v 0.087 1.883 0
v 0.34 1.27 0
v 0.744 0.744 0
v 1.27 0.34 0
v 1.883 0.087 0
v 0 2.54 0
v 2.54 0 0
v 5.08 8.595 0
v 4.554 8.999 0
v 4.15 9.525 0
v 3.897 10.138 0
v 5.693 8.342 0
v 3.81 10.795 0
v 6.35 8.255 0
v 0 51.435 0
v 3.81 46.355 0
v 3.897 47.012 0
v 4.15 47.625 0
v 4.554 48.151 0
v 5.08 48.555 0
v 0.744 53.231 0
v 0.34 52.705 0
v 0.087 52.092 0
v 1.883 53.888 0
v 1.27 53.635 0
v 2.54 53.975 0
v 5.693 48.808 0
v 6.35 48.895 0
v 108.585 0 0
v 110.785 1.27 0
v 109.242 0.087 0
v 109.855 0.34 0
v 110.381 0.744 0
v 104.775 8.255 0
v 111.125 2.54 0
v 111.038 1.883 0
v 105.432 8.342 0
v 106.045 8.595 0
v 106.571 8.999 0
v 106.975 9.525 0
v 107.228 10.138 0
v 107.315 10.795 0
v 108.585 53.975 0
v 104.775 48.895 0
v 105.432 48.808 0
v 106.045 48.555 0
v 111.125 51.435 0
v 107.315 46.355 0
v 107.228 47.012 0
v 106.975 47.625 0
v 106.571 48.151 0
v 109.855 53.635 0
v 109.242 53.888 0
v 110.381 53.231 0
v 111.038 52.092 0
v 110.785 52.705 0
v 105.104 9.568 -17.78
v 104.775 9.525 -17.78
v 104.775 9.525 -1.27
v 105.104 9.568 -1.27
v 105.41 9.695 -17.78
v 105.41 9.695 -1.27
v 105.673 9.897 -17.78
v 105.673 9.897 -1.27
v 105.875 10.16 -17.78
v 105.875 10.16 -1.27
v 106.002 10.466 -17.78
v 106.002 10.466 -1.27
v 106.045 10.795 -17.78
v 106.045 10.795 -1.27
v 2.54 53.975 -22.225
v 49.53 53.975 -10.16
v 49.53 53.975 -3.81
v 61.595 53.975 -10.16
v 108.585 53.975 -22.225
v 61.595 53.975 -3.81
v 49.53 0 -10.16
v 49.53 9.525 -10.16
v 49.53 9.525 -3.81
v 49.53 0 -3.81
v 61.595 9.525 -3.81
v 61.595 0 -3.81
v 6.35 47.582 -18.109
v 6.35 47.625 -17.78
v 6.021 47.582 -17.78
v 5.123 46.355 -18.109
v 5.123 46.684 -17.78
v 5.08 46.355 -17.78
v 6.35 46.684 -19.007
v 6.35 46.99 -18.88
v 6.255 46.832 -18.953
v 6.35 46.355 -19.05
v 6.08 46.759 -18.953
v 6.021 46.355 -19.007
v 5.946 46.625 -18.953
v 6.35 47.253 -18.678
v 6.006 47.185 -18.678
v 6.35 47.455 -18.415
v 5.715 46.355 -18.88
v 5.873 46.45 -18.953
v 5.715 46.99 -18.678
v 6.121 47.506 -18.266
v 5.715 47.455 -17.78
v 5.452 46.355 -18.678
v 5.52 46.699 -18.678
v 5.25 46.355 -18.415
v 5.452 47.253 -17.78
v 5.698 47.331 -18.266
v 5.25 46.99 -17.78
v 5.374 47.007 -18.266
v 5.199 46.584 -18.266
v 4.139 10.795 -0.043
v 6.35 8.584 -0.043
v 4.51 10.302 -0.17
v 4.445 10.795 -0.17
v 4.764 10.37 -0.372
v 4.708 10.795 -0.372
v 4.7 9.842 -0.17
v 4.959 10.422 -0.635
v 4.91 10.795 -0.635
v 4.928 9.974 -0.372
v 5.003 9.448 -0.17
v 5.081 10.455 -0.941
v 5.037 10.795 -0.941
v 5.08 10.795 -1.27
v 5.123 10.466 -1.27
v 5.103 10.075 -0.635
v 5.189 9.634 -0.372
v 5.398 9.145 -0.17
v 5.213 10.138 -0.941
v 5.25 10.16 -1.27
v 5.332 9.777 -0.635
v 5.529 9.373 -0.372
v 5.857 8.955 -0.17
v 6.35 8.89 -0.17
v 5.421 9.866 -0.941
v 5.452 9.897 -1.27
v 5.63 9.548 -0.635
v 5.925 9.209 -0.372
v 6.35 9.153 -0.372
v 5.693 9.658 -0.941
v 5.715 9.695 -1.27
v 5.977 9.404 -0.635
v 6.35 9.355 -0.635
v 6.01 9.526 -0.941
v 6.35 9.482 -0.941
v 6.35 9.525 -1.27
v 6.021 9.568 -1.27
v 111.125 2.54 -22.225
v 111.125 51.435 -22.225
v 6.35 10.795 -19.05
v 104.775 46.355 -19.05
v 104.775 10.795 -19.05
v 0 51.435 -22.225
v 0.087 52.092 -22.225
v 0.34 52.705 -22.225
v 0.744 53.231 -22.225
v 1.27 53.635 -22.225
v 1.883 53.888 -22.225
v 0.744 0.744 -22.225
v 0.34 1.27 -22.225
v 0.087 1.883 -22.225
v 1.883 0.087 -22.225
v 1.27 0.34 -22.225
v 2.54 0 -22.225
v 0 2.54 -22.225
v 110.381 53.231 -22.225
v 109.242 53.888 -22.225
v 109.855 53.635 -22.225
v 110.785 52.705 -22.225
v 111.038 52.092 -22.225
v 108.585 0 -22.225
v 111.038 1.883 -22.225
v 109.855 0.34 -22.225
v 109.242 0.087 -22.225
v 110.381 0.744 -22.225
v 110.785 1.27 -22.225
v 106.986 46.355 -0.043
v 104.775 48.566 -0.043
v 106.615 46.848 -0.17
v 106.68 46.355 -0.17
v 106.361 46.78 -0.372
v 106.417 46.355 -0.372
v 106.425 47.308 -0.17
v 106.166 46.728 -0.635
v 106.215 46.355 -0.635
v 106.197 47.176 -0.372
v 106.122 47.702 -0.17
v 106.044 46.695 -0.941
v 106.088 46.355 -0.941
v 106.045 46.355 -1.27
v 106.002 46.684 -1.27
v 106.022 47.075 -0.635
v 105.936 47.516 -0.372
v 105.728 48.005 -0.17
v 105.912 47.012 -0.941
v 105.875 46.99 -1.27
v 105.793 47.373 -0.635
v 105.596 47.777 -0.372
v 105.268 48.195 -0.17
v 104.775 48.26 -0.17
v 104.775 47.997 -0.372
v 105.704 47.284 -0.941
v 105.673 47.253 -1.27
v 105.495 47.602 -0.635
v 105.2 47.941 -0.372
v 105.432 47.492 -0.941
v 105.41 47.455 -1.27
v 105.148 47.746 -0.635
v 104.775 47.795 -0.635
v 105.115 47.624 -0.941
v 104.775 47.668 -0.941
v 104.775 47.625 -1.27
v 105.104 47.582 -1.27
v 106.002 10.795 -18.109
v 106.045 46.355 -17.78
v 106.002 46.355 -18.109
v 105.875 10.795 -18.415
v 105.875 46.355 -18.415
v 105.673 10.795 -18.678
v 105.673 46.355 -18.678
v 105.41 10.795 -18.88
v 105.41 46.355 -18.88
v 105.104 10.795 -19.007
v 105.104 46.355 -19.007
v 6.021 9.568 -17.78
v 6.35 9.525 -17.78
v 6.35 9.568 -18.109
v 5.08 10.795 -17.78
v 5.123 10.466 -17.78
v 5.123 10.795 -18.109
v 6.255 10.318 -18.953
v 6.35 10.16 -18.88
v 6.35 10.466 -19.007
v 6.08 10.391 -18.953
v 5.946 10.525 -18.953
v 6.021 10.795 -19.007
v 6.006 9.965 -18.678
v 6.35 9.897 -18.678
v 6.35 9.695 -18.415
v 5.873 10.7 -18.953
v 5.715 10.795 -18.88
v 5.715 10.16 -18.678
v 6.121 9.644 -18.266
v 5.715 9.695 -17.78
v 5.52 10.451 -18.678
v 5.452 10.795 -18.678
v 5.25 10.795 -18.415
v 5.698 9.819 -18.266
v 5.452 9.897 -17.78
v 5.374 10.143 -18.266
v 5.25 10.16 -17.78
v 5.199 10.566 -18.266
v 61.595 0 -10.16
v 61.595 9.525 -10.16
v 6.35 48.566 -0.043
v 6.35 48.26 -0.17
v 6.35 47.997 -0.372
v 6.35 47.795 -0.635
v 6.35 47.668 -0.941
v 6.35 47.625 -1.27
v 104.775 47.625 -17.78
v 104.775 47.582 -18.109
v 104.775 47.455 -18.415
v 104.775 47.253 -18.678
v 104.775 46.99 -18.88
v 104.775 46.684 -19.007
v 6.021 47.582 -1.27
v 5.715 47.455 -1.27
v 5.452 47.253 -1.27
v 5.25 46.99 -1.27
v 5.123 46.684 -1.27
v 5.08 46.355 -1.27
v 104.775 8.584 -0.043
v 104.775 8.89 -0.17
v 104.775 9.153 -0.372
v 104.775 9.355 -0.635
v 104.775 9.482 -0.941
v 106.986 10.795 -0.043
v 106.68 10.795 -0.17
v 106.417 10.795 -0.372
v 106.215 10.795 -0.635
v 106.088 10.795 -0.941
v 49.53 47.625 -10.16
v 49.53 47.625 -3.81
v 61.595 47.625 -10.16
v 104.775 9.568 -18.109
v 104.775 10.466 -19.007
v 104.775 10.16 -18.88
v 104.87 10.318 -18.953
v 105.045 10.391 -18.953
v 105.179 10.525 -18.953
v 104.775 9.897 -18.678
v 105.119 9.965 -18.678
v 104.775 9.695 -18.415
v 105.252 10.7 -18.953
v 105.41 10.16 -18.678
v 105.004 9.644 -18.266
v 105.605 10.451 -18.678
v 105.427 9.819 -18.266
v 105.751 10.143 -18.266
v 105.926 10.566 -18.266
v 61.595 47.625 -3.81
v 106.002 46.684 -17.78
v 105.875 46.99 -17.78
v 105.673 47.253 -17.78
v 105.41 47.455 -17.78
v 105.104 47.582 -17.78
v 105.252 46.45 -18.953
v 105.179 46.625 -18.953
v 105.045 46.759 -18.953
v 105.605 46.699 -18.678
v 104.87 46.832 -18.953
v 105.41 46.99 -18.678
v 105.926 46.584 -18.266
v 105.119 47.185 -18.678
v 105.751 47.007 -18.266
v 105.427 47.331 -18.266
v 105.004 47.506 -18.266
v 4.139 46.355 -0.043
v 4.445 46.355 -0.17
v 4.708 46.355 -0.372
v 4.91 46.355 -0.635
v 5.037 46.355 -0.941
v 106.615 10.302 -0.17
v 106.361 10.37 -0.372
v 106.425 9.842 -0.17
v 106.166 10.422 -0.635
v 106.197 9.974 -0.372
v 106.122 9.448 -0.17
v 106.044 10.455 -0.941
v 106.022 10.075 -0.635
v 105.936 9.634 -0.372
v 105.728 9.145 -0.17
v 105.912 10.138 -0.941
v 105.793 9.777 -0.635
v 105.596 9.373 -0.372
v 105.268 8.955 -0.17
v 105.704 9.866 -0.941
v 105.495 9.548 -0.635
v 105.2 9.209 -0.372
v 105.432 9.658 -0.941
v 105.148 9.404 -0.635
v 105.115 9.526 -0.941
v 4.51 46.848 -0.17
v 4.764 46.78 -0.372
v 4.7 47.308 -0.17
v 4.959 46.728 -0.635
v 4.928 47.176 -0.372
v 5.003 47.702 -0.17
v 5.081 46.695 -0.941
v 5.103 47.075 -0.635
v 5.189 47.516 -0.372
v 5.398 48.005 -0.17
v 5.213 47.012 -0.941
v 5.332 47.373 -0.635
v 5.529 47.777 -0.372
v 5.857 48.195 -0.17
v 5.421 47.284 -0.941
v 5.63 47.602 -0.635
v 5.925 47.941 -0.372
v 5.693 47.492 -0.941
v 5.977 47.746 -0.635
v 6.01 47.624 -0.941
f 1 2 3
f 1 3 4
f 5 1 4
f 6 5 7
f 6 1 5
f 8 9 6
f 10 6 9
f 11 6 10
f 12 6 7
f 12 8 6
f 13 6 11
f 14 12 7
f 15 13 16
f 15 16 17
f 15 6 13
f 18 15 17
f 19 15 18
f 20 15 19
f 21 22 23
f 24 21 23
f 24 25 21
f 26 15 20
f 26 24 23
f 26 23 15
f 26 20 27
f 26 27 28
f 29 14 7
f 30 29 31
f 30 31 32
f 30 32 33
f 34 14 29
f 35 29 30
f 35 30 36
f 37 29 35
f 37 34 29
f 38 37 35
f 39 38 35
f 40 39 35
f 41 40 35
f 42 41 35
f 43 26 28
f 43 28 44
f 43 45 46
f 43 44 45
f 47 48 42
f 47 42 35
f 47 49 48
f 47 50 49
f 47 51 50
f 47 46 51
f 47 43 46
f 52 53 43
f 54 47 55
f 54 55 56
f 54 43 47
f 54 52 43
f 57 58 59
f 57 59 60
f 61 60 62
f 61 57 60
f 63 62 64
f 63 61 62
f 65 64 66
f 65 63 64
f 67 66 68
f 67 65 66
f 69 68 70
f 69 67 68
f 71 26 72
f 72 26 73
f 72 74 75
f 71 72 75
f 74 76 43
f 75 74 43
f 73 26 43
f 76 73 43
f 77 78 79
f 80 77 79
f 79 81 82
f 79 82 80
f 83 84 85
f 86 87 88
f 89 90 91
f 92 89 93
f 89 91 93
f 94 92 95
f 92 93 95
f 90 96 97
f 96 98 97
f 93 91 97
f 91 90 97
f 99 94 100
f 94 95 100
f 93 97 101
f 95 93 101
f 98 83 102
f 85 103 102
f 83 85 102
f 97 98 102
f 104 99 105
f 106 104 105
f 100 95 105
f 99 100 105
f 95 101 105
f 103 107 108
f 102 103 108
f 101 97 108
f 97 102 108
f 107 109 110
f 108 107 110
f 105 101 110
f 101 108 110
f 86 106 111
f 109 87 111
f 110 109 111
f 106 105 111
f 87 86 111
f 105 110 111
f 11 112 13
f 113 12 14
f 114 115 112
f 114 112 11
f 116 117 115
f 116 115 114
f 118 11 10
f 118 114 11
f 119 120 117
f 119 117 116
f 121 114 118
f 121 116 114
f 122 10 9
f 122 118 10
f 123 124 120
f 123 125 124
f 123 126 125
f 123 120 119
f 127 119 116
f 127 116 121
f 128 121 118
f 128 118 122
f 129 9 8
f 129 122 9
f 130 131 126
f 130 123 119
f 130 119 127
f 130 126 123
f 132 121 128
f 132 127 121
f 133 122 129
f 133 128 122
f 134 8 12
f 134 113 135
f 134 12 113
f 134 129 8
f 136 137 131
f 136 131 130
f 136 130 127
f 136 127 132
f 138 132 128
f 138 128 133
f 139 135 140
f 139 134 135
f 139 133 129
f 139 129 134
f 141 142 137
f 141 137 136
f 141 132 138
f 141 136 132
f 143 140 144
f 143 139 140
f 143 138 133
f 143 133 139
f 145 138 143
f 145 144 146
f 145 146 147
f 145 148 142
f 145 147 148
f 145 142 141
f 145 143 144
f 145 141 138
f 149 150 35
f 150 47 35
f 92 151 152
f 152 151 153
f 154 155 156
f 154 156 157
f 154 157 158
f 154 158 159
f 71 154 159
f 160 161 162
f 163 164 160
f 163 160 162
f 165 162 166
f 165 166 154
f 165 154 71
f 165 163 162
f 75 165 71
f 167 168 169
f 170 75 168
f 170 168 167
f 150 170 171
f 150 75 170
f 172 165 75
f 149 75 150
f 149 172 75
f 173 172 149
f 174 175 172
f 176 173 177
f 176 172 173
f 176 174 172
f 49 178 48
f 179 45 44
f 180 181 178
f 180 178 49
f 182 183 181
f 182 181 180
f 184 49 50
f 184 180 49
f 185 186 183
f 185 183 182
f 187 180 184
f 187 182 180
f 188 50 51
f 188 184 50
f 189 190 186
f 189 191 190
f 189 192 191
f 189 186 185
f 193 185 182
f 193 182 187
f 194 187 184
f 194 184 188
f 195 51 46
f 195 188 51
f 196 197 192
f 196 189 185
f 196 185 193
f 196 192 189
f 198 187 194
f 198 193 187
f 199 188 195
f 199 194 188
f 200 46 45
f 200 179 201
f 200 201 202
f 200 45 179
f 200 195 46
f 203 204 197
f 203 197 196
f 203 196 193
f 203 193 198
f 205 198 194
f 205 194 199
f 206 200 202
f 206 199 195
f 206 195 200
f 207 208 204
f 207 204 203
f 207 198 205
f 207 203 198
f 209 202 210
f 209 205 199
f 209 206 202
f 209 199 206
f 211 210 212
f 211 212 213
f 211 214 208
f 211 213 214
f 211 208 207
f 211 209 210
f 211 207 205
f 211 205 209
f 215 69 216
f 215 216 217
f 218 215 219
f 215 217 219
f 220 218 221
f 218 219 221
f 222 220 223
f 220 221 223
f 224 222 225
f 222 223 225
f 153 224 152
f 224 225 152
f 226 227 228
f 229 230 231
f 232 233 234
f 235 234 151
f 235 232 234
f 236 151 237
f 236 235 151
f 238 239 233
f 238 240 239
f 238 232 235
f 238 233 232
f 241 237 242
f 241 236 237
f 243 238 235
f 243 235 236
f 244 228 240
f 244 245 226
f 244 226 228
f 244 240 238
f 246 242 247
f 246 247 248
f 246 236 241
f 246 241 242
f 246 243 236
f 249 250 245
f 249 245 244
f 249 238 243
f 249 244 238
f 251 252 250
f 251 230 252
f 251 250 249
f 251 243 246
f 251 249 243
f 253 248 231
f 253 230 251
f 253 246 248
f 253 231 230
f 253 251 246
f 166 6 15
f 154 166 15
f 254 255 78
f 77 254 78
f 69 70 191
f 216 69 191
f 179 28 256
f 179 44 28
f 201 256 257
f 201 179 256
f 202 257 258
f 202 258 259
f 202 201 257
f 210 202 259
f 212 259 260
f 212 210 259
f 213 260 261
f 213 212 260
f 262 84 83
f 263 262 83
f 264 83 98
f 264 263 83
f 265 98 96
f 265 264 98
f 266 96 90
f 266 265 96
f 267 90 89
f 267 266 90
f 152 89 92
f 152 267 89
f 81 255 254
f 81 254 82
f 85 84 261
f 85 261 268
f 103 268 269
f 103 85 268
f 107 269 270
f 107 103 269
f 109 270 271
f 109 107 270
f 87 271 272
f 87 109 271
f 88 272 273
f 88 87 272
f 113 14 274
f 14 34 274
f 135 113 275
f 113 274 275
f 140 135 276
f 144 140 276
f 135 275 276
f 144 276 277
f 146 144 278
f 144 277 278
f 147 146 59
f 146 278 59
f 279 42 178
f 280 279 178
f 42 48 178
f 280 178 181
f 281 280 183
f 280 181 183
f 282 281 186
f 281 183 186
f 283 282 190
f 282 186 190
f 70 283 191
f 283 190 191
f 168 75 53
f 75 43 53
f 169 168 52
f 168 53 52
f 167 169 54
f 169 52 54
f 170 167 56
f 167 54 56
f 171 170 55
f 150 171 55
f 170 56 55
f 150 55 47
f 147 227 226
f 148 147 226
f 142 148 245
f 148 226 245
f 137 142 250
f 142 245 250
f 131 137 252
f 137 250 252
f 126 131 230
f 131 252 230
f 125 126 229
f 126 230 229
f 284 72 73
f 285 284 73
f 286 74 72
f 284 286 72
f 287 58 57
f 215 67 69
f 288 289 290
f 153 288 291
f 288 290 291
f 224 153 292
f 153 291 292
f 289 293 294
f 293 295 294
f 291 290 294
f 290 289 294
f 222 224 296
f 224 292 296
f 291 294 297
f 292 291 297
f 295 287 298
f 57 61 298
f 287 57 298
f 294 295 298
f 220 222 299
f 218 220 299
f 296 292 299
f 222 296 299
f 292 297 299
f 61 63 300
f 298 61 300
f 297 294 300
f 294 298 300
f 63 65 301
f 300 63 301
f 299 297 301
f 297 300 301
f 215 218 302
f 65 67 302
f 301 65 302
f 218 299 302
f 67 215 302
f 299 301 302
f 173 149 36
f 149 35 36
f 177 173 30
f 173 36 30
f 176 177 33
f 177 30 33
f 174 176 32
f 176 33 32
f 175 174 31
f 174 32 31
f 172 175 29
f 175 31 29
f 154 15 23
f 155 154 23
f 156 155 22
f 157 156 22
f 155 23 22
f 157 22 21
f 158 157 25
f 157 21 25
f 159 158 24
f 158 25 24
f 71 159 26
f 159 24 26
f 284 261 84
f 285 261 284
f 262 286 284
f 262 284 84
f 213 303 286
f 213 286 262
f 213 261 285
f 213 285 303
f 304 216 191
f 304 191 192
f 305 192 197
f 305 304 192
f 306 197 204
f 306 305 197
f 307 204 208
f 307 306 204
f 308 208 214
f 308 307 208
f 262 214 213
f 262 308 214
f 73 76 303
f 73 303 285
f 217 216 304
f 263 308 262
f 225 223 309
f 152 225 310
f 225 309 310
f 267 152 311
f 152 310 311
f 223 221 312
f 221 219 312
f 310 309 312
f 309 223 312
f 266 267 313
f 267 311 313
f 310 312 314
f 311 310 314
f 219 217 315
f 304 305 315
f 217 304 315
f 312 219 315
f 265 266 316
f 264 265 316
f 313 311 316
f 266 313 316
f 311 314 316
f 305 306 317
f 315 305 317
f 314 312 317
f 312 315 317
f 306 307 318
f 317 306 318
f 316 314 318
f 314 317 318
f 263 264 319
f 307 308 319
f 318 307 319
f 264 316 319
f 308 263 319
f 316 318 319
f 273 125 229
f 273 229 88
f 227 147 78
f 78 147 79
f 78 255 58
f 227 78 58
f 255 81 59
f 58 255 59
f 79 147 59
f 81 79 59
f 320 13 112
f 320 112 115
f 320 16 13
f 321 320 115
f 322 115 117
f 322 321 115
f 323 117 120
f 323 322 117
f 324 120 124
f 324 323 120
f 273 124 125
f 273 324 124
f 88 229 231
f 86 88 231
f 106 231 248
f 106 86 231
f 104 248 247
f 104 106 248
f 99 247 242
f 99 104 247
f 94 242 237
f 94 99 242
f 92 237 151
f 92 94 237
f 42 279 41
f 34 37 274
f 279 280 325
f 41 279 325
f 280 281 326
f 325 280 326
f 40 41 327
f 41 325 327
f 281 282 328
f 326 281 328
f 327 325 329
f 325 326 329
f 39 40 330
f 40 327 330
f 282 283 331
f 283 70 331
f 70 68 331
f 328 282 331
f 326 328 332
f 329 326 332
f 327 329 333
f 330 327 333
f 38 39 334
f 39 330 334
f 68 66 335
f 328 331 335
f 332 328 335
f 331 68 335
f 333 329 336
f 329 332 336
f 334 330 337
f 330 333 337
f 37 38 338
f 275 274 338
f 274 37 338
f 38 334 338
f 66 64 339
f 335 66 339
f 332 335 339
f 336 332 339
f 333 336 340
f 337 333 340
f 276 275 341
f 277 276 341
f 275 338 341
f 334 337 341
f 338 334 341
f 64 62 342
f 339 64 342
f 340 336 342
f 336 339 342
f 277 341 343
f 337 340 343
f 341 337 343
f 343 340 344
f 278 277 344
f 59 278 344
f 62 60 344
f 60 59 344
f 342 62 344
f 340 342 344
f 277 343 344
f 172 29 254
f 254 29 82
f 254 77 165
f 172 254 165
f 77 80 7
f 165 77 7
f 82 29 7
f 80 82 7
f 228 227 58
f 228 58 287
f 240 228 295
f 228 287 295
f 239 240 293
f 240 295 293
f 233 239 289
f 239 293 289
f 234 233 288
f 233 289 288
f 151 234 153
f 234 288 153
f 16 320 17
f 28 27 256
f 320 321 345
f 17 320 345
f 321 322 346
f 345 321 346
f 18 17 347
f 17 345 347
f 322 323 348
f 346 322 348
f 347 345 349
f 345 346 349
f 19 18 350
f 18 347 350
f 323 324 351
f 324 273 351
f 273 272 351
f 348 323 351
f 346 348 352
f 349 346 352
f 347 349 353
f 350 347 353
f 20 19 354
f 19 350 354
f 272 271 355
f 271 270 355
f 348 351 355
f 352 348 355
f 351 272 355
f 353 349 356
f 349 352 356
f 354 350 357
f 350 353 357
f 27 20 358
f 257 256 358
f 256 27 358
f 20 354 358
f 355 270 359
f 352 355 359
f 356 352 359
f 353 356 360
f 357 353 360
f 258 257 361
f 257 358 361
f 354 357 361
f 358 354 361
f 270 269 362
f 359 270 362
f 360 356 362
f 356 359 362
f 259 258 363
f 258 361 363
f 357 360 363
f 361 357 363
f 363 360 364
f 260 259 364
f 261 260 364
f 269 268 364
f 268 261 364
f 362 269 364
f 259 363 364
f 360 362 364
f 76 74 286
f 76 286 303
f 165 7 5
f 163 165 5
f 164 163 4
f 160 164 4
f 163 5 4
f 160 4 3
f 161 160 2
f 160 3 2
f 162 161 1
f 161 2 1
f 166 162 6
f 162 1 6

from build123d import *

# Parameters (mm, degrees)
F0_W     = 100.965
F0_H     = 38.1
F1_DEPTH = 19.05
F2_W     = 50.4825
F2_H     = 20.6375
F2_H_2   = 17.4625
F3_DEPTH = 3.175
F4_W     = 12.065
F4_H     = 6.35
F5_DEPTH = 53.976
F6_R     = 1.27


with BuildPart() as f1:
    # F0 (on Top) → F1 (new body)
    with BuildSketch(Plane.XY):
        with BuildLine():
            ThreePointArc((0, 2.54), (0.7439487758, 0.7439487758), (2.54, 0))
            Line((2.54, 0), (108.585, 0))
            ThreePointArc((108.585, 0), (110.3810512242, 0.7439487758), (111.125, 2.54))
            Line((111.125, 2.54), (111.125, 51.435))
            ThreePointArc((111.125, 51.435), (110.3810512242, 53.2310512242), (108.585, 53.975))
            Line((108.585, 53.975), (2.54, 53.975))
            ThreePointArc((2.54, 53.975), (0.7439487758, 53.2310512242), (0, 51.435))
            Line((0, 51.435), (0, 2.54))
        make_face()
        with Locations((55.5625, 28.575)):
            Rectangle(F0_W, F0_H, mode=Mode.SUBTRACT)
    extrude(amount=-F1_DEPTH)

    # F2 (on face) → F3 (join)
    with BuildSketch(Plane(origin=(0, 0, -19.05), x_dir=(1, 0, 0), z_dir=(0, 0, -1))):
        with BuildLine():
            ThreePointArc((0, -51.435), (0.7439487758, -53.2310512242), (2.54, -53.975))
            Line((2.54, -53.975), (55.5625, -53.975))
            Line((55.5625, -53.975), (55.5625, -47.625))
            Line((55.5625, -47.625), (5.08, -47.625))
            Line((5.08, -47.625), (5.08, -26.9875))
            Line((5.08, -26.9875), (0, -26.9875))
            Line((0, -26.9875), (0, -51.435))
        make_face()
        with BuildLine():
            Line((55.5625, -47.625), (55.5625, -53.975))
            Line((55.5625, -53.975), (108.585, -53.975))
            ThreePointArc((108.585, -53.975), (110.3810512242, -53.2310512242), (111.125, -51.435))
            Line((111.125, -51.435), (111.125, -26.9875))
            Line((111.125, -26.9875), (106.045, -26.9875))
            Line((106.045, -26.9875), (106.045, -47.625))
            Line((106.045, -47.625), (55.5625, -47.625))
        make_face()
        with BuildLine():
            Line((0, -2.54), (0, -26.9875))
            Line((0, -26.9875), (5.08, -26.9875))
            Line((5.08, -26.9875), (5.08, -9.525))
            Line((5.08, -9.525), (55.5625, -9.525))
            Line((55.5625, -9.525), (55.5625, 0))
            Line((55.5625, 0), (2.54, 0))
            ThreePointArc((2.54, 0), (0.7439487758, -0.7439487758), (0, -2.54))
        make_face()
        with BuildLine():
            Line((106.045, -26.9875), (111.125, -26.9875))
            Line((111.125, -26.9875), (111.125, -2.54))
            ThreePointArc((111.125, -2.54), (110.3810512242, -0.7439487758), (108.585, 0))
            Line((108.585, 0), (55.5625, 0))
            Line((55.5625, 0), (55.5625, -9.525))
            Line((55.5625, -9.525), (106.045, -9.525))
            Line((106.045, -9.525), (106.045, -26.9875))
        make_face()
        with Locations((30.32125, -37.30625)):
            Rectangle(F2_W, F2_H)
        with Locations((30.32125, -18.25625)):
            Rectangle(F2_W, F2_H_2)
        with Locations((80.80375, -18.25625)):
            Rectangle(F2_W, F2_H_2)
        with Locations((80.80375, -37.30625)):
            Rectangle(F2_W, F2_H)
    extrude(amount=F3_DEPTH)

    # F4 (on face) → F5 (cut, through all)
    with BuildSketch(Plane(origin=(0, 53.975, 0), x_dir=(-1, 0, 0), z_dir=(0, 1, 0))):
        with Locations((-55.5625, -6.985)):
            Rectangle(F4_W, F4_H)
    extrude(amount=-F5_DEPTH, mode=Mode.SUBTRACT)

    # F6
    f6_edges = [f1.edges().sort_by_distance(p)[0] for p in [
        (5.08, 47.625, -9.525),
        (106.045, 47.625, -9.525),
        (5.08, 9.525, -9.525),
        (106.045, 9.525, -9.525),
        (55.5625, 9.525, -19.05),
        (106.045, 28.575, -19.05),
        (55.5625, 47.625, -19.05),
        (5.08, 28.575, -19.05),
        (106.045, 28.575, 0),
        (5.08, 28.575, 0),
        (55.5625, 47.625, 0),
        (55.5625, 9.525, 0),
    ]]
    fillet(f6_edges, radius=F6_R)


solid = f1.part
